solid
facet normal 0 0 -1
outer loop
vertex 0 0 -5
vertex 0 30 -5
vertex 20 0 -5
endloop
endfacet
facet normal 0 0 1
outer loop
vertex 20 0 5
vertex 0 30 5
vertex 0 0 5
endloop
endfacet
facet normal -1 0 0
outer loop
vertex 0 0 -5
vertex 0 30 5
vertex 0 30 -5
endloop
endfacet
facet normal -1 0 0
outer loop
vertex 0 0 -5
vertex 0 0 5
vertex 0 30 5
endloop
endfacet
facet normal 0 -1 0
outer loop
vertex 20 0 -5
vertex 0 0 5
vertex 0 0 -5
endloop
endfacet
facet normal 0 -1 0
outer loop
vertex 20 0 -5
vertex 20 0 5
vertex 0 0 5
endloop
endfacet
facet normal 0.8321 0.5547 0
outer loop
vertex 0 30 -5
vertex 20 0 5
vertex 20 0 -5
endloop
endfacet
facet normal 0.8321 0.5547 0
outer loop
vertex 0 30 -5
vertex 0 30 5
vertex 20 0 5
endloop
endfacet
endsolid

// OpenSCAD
//create complexgeometries from points in space

linear_extrude(height = 10, center = true)
    polygon(points = [[0,0], [20,0], [0,30]]);
